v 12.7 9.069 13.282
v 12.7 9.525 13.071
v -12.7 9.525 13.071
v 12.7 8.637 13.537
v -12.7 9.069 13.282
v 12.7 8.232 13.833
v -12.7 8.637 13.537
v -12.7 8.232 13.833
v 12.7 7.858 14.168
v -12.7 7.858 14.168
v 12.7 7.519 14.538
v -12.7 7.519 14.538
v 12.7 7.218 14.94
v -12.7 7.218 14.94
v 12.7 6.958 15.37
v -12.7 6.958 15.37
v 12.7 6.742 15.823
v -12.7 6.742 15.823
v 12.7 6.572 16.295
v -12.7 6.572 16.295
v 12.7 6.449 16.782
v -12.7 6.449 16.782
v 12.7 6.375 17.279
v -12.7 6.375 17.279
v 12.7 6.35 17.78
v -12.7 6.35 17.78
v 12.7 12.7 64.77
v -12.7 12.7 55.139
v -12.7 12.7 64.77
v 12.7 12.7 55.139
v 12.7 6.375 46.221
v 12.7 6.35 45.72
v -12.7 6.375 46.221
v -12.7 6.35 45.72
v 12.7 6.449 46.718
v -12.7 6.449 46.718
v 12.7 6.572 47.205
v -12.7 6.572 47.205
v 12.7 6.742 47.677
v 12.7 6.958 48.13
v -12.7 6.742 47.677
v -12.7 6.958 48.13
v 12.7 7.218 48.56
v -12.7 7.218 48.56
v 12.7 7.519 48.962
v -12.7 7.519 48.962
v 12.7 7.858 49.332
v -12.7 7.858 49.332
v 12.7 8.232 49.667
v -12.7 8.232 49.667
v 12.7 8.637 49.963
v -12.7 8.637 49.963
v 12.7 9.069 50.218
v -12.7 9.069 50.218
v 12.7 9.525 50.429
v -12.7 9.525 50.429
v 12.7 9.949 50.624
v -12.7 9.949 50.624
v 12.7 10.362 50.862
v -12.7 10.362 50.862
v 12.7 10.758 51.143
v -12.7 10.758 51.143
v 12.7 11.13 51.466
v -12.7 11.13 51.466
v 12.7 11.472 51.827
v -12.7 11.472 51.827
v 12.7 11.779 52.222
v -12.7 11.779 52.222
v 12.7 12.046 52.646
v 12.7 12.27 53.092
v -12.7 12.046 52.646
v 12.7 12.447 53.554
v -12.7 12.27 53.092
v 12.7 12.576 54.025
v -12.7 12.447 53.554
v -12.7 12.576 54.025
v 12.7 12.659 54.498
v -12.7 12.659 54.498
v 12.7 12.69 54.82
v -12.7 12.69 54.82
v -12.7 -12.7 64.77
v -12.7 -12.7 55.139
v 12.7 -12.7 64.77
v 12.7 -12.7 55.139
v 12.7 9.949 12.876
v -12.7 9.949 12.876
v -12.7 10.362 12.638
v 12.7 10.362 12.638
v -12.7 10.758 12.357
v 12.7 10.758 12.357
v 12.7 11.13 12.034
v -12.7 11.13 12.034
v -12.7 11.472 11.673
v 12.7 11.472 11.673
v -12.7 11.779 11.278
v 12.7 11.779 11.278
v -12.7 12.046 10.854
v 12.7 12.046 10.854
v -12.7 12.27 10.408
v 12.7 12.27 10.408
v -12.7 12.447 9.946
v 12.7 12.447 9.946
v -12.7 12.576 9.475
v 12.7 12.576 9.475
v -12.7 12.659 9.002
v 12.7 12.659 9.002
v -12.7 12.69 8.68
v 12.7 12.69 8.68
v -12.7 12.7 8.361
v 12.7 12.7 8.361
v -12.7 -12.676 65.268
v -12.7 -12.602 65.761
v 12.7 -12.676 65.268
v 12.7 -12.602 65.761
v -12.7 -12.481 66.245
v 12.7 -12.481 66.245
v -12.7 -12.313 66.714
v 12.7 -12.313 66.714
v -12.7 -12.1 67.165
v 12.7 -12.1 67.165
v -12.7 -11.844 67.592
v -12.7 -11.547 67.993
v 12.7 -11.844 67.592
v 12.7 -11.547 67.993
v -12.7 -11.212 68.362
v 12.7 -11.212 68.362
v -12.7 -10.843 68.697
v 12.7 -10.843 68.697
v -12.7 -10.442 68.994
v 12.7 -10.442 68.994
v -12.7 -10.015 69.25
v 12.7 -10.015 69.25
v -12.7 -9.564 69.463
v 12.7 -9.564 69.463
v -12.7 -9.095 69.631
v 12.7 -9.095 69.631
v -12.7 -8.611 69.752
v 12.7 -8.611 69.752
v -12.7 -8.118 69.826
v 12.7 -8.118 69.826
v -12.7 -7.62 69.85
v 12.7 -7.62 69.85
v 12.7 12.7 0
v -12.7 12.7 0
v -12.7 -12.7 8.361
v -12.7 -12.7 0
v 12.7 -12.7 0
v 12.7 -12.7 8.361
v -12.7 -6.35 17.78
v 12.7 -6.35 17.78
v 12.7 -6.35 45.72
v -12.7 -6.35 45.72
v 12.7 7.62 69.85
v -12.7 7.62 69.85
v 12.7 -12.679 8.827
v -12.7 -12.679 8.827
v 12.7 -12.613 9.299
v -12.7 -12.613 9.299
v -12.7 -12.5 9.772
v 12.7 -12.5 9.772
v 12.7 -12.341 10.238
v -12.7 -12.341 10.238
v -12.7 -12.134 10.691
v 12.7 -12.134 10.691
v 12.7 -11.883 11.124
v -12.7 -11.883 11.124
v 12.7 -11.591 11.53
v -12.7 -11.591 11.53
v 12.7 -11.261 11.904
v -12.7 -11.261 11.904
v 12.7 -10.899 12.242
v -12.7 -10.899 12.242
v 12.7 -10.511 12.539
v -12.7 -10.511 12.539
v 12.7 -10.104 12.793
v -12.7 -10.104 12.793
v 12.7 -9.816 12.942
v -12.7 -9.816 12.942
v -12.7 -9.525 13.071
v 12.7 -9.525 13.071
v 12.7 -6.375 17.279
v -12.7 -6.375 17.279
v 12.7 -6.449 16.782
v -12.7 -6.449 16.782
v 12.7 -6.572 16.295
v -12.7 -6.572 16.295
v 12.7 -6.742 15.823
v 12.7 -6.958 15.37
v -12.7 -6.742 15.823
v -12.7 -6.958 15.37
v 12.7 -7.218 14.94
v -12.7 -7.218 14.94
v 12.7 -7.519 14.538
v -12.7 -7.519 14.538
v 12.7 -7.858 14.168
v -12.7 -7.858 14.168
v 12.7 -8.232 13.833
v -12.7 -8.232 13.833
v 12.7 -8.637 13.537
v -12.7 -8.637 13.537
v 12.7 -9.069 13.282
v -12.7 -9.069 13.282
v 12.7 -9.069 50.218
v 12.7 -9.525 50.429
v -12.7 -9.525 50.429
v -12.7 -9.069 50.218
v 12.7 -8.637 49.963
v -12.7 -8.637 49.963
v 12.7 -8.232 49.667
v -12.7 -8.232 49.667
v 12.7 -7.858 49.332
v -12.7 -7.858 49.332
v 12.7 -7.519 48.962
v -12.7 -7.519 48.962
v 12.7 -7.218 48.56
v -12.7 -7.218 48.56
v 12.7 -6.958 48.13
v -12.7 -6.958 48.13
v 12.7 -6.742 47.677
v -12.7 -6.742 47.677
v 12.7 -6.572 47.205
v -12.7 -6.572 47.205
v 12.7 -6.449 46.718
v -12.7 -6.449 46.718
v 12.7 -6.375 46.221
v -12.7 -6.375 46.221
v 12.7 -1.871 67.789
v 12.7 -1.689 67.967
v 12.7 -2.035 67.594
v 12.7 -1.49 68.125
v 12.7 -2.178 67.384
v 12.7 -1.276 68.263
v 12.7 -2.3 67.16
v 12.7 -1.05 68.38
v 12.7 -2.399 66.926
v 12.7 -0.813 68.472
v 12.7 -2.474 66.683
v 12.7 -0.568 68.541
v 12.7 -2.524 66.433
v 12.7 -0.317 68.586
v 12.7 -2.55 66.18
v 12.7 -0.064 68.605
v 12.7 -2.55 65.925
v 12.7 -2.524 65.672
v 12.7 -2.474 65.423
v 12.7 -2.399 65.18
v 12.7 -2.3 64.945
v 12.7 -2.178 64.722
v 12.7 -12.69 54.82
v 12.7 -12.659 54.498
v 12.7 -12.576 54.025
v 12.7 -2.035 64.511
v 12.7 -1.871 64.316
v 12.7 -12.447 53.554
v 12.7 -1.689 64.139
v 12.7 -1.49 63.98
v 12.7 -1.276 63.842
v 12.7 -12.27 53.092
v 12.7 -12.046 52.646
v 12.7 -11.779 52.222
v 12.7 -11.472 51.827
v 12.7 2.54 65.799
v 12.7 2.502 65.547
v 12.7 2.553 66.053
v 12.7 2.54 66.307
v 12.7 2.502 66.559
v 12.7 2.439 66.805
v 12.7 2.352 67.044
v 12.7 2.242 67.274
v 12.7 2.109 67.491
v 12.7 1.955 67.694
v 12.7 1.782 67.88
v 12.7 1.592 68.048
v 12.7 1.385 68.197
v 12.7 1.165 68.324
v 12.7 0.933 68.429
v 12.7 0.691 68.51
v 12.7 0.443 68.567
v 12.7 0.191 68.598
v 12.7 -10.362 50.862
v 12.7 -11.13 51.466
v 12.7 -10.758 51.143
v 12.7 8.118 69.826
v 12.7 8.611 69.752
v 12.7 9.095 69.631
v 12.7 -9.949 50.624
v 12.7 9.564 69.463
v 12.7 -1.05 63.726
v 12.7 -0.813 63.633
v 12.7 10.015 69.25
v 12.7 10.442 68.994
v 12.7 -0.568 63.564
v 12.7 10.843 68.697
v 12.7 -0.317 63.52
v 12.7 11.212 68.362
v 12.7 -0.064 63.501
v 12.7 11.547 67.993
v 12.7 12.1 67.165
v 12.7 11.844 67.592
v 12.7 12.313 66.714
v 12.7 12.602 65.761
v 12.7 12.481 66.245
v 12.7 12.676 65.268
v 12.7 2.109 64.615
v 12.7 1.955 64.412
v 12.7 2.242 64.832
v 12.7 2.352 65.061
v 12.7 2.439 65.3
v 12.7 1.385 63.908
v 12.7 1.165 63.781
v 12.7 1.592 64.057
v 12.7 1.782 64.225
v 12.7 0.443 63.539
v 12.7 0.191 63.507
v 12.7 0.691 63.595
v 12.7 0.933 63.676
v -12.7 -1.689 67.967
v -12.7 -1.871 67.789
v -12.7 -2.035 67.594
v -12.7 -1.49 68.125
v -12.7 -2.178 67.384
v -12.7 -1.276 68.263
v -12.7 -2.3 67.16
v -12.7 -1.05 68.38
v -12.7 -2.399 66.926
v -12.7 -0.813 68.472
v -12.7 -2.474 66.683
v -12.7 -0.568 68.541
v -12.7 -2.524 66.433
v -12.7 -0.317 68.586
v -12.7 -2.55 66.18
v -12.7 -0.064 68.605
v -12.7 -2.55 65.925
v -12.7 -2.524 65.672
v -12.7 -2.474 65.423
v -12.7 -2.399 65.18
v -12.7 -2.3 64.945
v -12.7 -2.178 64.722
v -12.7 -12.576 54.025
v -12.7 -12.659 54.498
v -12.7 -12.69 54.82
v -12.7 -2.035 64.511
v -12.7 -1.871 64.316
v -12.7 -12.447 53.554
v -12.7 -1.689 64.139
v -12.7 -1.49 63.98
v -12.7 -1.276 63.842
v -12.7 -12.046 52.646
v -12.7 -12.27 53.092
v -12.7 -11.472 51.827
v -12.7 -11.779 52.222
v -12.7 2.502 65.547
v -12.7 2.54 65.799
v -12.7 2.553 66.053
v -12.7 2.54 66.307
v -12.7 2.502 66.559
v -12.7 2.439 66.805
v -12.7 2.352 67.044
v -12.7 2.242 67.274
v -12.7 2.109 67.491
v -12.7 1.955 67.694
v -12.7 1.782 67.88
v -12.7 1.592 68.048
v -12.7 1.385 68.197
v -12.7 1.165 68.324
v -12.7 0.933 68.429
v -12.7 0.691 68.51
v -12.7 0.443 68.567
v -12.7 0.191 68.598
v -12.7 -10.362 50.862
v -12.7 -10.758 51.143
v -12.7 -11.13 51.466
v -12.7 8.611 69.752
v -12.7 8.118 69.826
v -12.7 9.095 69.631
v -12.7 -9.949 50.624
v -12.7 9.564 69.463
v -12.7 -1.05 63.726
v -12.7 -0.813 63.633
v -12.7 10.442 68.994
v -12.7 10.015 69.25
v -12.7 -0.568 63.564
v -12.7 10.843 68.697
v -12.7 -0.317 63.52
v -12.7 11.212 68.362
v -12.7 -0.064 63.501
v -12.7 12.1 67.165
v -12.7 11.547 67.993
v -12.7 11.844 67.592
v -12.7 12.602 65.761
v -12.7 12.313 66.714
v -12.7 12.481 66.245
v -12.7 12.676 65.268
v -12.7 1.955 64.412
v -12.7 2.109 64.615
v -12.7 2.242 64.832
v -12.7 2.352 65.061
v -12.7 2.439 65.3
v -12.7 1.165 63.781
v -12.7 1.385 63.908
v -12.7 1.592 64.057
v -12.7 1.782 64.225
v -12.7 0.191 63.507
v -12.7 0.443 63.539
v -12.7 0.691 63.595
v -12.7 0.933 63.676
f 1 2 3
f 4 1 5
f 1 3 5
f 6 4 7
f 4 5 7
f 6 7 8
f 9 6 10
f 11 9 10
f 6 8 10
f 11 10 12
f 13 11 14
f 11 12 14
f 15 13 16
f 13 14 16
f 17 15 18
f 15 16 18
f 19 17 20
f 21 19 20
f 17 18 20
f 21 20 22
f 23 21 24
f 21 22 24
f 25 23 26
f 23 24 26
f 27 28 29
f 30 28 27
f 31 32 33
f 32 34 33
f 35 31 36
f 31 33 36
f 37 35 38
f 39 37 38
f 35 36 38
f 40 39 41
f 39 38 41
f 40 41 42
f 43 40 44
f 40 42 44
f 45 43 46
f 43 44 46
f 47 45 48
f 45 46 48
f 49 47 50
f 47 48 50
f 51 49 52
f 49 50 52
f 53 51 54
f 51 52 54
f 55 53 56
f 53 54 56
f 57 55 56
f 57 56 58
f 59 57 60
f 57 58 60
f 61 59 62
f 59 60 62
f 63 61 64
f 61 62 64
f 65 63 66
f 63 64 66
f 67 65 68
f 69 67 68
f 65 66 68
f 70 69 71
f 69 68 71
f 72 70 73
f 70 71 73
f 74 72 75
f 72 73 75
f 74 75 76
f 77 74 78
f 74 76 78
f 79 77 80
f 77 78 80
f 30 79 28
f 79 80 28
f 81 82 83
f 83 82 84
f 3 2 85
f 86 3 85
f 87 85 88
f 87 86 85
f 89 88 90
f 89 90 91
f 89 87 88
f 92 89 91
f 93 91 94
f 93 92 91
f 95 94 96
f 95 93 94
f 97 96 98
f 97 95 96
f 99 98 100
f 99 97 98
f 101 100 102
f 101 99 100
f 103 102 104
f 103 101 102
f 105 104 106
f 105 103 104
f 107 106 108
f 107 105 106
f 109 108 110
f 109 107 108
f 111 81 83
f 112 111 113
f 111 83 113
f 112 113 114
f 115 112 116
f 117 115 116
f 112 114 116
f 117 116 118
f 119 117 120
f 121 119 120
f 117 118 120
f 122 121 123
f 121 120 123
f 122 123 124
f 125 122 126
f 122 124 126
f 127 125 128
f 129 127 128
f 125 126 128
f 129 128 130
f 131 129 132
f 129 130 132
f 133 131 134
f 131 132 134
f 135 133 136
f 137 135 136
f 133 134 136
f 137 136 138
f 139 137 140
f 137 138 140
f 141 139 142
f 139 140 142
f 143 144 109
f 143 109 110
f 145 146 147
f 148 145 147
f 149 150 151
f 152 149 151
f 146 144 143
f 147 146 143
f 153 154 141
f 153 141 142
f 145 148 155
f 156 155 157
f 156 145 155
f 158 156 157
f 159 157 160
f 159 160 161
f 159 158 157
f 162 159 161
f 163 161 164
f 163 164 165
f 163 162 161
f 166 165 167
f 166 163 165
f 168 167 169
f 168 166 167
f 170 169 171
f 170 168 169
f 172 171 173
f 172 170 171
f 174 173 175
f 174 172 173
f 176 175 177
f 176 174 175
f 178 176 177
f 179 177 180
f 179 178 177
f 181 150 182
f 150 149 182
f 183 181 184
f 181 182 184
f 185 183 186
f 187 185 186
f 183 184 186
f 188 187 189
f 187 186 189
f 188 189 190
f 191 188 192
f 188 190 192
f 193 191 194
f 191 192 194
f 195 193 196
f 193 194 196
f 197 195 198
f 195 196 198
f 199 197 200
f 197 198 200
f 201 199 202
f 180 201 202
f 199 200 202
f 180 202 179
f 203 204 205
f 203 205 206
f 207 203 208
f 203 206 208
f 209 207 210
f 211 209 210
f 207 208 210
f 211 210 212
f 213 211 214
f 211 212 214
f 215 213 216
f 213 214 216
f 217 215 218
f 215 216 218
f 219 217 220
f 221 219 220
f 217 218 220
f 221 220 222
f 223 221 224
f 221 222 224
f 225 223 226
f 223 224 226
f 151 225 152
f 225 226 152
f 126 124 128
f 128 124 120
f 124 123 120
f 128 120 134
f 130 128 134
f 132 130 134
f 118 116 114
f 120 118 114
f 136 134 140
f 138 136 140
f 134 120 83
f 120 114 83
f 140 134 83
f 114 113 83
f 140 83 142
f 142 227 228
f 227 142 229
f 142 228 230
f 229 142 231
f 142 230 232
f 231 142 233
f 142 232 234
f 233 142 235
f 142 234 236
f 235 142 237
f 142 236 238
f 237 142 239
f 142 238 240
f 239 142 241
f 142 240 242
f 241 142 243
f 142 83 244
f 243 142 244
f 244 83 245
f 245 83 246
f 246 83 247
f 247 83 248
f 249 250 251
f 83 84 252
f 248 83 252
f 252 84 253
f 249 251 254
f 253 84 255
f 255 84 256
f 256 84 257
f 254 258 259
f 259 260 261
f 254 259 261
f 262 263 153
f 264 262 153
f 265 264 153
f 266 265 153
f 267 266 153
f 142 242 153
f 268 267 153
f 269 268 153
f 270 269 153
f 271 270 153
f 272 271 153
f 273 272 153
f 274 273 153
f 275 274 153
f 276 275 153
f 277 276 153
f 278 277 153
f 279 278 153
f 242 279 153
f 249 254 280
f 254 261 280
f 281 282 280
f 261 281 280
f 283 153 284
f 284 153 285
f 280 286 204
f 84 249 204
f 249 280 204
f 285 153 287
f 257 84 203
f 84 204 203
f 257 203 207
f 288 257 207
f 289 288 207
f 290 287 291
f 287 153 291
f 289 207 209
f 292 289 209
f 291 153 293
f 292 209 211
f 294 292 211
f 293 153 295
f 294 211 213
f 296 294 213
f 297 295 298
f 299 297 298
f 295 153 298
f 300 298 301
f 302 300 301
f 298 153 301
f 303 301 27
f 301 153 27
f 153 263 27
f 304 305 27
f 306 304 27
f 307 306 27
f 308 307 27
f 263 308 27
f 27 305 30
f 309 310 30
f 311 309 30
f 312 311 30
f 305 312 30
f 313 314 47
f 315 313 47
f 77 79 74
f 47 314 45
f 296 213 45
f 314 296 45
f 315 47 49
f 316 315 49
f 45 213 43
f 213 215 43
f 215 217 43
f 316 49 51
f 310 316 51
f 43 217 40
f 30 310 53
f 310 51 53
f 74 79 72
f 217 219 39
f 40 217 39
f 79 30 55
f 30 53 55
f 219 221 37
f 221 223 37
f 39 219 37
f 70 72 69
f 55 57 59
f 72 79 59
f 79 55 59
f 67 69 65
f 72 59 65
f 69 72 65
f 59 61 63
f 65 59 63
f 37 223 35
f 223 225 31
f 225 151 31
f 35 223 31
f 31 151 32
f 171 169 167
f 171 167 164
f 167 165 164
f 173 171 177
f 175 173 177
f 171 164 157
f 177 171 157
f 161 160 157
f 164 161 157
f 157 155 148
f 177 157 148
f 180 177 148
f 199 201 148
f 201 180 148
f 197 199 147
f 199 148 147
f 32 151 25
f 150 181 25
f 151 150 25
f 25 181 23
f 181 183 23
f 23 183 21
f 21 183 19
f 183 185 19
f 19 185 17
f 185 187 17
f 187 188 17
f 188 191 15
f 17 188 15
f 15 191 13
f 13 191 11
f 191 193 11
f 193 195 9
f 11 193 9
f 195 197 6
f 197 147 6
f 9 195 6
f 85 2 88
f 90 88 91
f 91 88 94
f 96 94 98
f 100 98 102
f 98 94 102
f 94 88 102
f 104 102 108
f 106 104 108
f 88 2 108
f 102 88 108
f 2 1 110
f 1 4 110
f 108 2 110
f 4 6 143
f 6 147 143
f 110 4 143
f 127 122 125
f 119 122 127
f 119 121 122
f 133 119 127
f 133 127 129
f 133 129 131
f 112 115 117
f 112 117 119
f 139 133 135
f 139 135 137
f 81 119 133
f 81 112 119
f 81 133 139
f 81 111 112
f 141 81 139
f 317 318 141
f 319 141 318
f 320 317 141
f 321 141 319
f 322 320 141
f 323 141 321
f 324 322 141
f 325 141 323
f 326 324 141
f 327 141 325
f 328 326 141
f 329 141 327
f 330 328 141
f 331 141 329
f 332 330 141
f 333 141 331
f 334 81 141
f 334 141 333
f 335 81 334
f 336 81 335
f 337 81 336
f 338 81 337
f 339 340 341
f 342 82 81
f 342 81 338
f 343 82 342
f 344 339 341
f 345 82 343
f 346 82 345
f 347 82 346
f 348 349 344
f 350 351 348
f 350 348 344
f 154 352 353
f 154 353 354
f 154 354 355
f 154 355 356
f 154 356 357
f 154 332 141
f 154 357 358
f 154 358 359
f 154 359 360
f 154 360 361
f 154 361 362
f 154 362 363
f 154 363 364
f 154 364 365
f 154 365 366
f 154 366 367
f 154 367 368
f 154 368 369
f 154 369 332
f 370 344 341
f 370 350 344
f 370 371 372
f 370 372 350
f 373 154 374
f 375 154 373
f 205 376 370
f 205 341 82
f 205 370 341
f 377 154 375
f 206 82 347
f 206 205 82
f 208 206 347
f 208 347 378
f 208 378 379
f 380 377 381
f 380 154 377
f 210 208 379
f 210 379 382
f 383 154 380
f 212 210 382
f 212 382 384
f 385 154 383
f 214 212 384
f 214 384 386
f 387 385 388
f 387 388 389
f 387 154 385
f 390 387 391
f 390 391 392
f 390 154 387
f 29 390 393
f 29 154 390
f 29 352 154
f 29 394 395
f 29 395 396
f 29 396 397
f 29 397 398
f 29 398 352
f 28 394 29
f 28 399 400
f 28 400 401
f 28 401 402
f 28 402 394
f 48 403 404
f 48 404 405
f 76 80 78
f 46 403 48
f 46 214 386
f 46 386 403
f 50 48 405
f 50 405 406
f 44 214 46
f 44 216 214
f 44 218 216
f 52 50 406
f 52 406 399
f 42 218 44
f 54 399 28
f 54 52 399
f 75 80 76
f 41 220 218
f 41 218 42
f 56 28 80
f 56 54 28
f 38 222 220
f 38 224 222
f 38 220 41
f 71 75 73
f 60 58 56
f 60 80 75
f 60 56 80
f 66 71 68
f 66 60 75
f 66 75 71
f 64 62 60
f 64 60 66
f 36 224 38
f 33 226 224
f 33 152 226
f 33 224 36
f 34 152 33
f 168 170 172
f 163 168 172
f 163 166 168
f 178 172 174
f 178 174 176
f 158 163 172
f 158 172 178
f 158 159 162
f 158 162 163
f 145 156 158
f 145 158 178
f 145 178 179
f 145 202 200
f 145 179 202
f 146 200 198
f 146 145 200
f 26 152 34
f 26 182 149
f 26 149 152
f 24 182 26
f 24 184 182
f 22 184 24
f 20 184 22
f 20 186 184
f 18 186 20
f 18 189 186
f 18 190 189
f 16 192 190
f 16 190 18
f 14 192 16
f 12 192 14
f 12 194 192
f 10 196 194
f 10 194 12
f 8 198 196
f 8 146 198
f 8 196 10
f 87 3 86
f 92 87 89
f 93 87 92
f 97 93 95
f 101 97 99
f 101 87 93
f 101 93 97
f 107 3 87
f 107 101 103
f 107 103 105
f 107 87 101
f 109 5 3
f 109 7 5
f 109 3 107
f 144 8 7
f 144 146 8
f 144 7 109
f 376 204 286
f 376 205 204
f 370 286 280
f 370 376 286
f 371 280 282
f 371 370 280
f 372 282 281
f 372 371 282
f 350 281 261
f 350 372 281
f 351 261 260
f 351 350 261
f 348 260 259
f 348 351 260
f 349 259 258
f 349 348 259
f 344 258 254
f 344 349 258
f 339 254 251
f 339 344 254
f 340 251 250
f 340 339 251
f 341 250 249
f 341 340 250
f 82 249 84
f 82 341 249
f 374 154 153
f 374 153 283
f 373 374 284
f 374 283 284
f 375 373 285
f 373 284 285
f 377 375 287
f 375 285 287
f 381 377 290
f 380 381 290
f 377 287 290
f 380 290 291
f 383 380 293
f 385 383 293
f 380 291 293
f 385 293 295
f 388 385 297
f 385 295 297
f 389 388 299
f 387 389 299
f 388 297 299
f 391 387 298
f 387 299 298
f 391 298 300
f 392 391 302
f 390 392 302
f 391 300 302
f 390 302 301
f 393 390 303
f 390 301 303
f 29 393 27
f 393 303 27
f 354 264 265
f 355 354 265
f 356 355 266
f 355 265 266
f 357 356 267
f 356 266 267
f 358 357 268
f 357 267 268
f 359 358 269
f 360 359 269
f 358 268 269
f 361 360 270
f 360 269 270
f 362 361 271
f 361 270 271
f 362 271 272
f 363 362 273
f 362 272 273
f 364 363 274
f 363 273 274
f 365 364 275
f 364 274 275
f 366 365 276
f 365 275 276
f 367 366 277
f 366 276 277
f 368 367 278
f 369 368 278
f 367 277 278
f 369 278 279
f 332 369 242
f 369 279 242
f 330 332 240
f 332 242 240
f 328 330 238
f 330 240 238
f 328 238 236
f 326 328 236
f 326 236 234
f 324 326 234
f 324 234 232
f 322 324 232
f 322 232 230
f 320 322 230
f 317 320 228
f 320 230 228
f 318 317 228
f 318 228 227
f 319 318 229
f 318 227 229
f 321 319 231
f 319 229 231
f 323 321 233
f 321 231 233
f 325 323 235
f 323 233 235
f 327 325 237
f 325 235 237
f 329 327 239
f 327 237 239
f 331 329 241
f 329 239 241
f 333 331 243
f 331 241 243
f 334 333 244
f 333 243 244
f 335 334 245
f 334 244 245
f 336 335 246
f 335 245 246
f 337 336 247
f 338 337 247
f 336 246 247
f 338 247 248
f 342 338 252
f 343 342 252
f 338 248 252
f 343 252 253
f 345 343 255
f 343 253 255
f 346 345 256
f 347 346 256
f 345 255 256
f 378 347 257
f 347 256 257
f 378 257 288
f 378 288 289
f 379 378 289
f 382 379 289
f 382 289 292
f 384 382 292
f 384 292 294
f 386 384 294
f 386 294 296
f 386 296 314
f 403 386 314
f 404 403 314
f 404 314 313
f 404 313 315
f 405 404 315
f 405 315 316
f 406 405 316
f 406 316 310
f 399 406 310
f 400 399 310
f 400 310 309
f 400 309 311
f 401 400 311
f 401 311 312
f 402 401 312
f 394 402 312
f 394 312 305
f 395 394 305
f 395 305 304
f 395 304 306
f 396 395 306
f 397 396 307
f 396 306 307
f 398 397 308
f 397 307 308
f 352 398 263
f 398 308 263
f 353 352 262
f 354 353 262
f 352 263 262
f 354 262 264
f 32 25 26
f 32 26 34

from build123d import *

# Parameters (mm, degrees)
F0_W     = 25.4
F0_H     = 25.4
F1_DEPTH = 69.85
F2_R     = 2.5527
F3_DEPTH = 25.4
F4_R     = 5.08
F5_W     = 6.35
F5_H     = 38.1
F6_DEPTH = 25.4
F7_R     = 5.08
F8_R     = 5.08


with BuildPart() as f1:
    # F0 (on Top) → F1 (new body)
    with BuildSketch(Plane.XY):
        Rectangle(F0_W, F0_H)
    extrude(amount=F1_DEPTH)

    # F2 (on face) → F3 (cut)
    with BuildSketch(Plane.YZ.offset(12.7)):
        with Locations((0, 66.0527)):
            Circle(F2_R)
    extrude(amount=-F3_DEPTH, mode=Mode.SUBTRACT)

    # F4
    f4_edges = [f1.edges().sort_by_distance(p)[0] for p in [
        (0, -12.7, 69.85),
        (0, 12.7, 69.85),
    ]]
    fillet(f4_edges, radius=F4_R)

    # F5 (on face) → F6 (cut)
    with BuildSketch(Plane.YZ.offset(12.7)):
        with Locations((-9.525, 31.75)):
            Rectangle(F5_W, F5_H)
        with Locations((9.525, 31.75)):
            Rectangle(F5_W, F5_H)
    extrude(amount=-F6_DEPTH, mode=Mode.SUBTRACT)

    # F7
    f7_edges = [f1.edges().sort_by_distance(p)[0] for p in [
        (0, 6.35, 50.8),
        (0, 6.35, 12.7),
        (0, -6.35, 50.8),
        (0, -6.35, 12.7),
    ]]
    fillet(f7_edges, radius=F7_R)

    # F8
    f8_edges = [f1.edges().sort_by_distance(p)[0] for p in [
        (0, -12.7, 12.7),
        (0, -12.7, 50.8),
        (0, 12.7, 12.7),
        (0, 12.7, 50.8),
    ]]
    fillet(f8_edges, radius=F8_R)


solid = f1.part
